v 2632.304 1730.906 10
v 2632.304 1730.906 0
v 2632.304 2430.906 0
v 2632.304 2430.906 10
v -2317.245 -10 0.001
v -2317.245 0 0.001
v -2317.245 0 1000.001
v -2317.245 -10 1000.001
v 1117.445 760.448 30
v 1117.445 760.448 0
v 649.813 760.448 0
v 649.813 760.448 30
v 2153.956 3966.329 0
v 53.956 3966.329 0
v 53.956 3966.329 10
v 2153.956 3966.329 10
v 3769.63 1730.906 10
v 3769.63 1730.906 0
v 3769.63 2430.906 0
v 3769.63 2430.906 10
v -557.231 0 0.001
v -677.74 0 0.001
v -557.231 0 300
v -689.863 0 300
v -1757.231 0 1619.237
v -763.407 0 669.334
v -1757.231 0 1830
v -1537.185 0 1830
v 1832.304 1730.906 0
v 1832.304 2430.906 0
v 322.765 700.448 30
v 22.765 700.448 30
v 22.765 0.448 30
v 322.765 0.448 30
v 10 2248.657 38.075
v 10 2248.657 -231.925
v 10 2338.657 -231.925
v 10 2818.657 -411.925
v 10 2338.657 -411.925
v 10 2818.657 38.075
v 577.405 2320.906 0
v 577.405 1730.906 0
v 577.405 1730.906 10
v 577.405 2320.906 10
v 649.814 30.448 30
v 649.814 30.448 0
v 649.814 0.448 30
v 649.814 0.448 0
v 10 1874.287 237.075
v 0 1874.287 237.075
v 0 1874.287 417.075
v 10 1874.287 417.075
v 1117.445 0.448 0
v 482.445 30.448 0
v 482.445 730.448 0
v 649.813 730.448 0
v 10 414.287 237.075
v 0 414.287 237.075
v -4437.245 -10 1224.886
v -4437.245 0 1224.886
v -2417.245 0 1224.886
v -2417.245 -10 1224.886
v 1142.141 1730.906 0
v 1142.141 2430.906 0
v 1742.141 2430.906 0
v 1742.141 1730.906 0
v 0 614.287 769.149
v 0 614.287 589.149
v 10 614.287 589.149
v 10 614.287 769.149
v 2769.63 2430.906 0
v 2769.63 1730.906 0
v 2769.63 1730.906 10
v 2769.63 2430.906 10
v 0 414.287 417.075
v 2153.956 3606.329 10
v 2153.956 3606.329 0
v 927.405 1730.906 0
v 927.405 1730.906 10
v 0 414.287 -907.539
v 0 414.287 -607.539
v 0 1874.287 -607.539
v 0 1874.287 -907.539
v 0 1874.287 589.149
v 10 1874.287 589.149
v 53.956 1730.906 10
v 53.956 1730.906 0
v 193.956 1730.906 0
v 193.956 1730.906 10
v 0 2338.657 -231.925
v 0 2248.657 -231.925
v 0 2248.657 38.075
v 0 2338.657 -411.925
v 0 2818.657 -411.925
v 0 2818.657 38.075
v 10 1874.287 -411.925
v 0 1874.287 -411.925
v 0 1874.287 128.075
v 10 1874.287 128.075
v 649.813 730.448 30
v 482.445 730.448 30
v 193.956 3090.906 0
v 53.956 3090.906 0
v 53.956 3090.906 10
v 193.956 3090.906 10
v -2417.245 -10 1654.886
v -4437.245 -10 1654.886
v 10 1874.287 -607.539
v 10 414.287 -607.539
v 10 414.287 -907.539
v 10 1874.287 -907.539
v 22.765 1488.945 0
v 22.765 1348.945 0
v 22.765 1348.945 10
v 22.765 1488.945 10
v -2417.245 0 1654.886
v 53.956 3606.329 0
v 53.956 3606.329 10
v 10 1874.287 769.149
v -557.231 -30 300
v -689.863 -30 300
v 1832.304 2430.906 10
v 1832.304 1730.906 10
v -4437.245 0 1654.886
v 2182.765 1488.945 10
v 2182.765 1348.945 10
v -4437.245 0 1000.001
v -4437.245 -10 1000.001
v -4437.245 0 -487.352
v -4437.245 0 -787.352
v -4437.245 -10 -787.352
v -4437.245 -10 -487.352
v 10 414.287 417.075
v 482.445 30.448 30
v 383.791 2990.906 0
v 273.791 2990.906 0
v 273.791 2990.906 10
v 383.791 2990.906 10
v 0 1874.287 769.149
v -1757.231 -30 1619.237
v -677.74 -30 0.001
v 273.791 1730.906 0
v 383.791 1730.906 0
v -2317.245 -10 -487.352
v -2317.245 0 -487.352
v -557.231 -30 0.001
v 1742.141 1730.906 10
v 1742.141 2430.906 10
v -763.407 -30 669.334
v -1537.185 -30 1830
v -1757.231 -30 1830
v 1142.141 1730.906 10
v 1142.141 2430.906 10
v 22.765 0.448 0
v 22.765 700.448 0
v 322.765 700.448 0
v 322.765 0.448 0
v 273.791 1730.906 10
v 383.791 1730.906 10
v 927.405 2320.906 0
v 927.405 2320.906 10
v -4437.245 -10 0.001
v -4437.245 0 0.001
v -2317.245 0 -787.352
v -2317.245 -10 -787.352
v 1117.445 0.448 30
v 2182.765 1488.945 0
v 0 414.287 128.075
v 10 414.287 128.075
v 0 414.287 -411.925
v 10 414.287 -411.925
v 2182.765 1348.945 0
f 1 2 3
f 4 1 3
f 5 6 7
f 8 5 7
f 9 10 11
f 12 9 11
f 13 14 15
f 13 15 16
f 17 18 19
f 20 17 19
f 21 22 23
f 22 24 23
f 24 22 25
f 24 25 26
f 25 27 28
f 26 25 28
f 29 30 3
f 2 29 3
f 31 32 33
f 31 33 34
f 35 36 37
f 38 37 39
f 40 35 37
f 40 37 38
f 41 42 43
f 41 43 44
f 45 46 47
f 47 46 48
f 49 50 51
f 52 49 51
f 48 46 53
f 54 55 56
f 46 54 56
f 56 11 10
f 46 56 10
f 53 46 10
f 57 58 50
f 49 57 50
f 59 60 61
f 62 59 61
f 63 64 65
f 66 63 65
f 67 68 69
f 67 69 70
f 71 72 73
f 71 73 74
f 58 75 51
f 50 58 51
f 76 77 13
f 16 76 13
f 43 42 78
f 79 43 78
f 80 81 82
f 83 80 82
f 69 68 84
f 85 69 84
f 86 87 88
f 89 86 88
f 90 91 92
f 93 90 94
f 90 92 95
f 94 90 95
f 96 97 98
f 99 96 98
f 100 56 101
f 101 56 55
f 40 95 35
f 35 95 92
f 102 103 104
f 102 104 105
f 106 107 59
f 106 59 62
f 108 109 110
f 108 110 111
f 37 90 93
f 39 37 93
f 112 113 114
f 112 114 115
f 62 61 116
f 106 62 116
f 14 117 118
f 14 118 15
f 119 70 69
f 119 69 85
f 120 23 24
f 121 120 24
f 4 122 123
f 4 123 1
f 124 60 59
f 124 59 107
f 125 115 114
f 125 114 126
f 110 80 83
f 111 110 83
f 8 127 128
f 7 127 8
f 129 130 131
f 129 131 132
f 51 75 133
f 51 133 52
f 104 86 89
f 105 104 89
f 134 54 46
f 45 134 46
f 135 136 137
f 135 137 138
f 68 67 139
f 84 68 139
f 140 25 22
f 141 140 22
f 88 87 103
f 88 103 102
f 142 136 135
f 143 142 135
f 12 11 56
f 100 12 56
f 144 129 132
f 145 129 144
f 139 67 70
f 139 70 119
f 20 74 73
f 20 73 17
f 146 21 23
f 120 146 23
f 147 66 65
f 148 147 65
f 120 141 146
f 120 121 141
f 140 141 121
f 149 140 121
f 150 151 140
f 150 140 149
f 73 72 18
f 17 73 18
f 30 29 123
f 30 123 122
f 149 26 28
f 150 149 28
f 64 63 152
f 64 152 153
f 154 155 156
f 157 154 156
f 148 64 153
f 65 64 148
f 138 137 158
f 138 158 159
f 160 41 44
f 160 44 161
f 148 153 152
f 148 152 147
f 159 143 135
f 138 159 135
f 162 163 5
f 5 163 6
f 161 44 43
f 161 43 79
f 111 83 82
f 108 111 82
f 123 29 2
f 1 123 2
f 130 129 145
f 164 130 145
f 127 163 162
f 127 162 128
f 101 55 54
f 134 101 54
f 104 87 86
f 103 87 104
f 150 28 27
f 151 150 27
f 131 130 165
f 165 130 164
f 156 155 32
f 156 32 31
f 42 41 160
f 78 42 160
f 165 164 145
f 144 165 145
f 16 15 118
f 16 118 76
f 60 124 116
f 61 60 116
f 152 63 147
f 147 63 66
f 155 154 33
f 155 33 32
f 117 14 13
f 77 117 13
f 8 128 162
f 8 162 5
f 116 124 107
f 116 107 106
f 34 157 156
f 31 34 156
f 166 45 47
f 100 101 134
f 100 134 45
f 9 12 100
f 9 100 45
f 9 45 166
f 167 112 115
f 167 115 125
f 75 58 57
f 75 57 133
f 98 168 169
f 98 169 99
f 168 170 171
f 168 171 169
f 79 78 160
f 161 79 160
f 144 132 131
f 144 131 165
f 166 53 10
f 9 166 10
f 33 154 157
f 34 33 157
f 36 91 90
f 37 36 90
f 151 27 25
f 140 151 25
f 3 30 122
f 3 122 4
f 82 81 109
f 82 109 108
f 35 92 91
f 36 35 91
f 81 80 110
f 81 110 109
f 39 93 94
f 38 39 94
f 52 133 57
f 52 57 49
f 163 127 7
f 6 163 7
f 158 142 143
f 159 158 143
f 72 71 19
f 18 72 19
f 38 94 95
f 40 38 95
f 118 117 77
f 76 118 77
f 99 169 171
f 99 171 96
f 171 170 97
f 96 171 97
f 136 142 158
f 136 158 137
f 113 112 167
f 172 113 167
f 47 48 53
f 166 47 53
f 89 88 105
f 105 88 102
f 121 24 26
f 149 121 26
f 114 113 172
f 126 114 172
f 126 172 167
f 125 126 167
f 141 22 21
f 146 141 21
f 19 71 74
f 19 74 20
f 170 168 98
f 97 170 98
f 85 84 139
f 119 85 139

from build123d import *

# Parameters (mm, degrees)
F0_W     = 300
F0_H     = 700
F1_DEPTH = 30
F0_W_2   = 2160
F0_H_2   = 140
F0_W_3   = 140
F0_H_3   = 1360
F0_W_4   = 110
F0_H_4   = 1260
F0_W_5   = 2100
F0_H_5   = 360
F0_W_6   = 350
F0_H_6   = 590
F0_W_7   = 600
F0_W_8   = 800
F0_W_9   = 1000
F2_DEPTH = 10
F4_DEPTH = 30
F3_W     = 2120
F3_H     = 1000
F3_W_2   = 2020
F3_H_2   = 430
F3_H_3   = 300
F5_DEPTH = 10
F6_W     = 1460
F6_H     = 180
F6_H_2   = 540
F6_W_2   = 1260
F6_H_3   = 300
F7_DEPTH = 10


with BuildPart() as f1:
    # F0 (on Top) → F1 (new body)
    with BuildSketch(Plane.XY):
        with Locations((172.764546, 350.448103)):
            Rectangle(F0_W, F0_H)
        Polygon((1117.445389, 760.448098), (649.813489, 760.448098), (649.813489, 730.448365), (482.445389, 730.448365), (482.445389, 30.44844), (649.813789, 30.44844), (649.813789, 0.448103), (1117.445389, 0.448103), align=None)
    extrude(amount=F1_DEPTH)


with BuildPart() as f2:
    # F0 (on Top) → F2 (new body)
    with BuildSketch(Plane.XY):
        with Locations((1102.764546, 1418.945141)):
            Rectangle(F0_W_2, F0_H_2)
        with Locations((123.955633, 2410.906367)):
            Rectangle(F0_W_3, F0_H_3)
        with Locations((328.791015, 2360.906367)):
            Rectangle(F0_W_4, F0_H_4)
        with Locations((1103.955633, 3786.328964)):
            Rectangle(F0_W_5, F0_H_5)
        with Locations((752.405453, 2025.906367)):
            Rectangle(F0_W_6, F0_H_6)
        with Locations((1442.140865, 2080.906367)):
            Rectangle(F0_W_7, F0_H)
        with Locations((2232.303524, 2080.906367)):
            Rectangle(F0_W_8, F0_H)
        with Locations((3269.630432, 2080.906367)):
            Rectangle(F0_W_9, F0_H)
    extrude(amount=F2_DEPTH)


with BuildPart() as f4:
    # F3 (on Front) → F4 (new body)
    with BuildSketch(Plane.XZ):
        Polygon((-677.740008, 0.000524), (-557.231205, 0.000524), (-557.231205, 300.000101), (-689.863086, 300.000101), (-763.407334, 669.334204), (-1537.184775, 1830.000365), (-1757.231205, 1830.000365), (-1757.231205, 1619.237318), align=None)
    extrude(amount=F4_DEPTH)


with BuildPart() as f5:
    # F3 (on Front) → F5 (new body)
    with BuildSketch(Plane.XZ):
        with Locations((-3377.244598, 500.000524)):
            Rectangle(F3_W, F3_H)
        with Locations((-3427.244598, 1439.886417)):
            Rectangle(F3_W_2, F3_H_2)
        with Locations((-3377.244598, -637.351787)):
            Rectangle(F3_W, F3_H_3)
    extrude(amount=F5_DEPTH)


with BuildPart() as f7:
    # F6 (on Right) → F7 (new body)
    with BuildSketch(Plane.YZ):
        with Locations((1144.286524, 327.075299)):
            Rectangle(F6_W, F6_H)
        with Locations((1144.286532, -141.924809)):
            Rectangle(F6_W, F6_H_2)
        Polygon((2338.656902, -231.924653), (2338.656902, -411.924809), (2818.656778, -411.924809), (2818.656778, 38.075191), (2248.656788, 38.075191), (2248.656788, -231.924653), align=None)
        with Locations((1244.286524, 679.148939)):
            Rectangle(F6_W_2, F6_H)
        with Locations((1144.286532, -757.539427)):
            Rectangle(F6_W, F6_H_3)
    extrude(amount=F7_DEPTH)


solid = Compound([f1.part, f2.part, f4.part, f5.part, f7.part])
